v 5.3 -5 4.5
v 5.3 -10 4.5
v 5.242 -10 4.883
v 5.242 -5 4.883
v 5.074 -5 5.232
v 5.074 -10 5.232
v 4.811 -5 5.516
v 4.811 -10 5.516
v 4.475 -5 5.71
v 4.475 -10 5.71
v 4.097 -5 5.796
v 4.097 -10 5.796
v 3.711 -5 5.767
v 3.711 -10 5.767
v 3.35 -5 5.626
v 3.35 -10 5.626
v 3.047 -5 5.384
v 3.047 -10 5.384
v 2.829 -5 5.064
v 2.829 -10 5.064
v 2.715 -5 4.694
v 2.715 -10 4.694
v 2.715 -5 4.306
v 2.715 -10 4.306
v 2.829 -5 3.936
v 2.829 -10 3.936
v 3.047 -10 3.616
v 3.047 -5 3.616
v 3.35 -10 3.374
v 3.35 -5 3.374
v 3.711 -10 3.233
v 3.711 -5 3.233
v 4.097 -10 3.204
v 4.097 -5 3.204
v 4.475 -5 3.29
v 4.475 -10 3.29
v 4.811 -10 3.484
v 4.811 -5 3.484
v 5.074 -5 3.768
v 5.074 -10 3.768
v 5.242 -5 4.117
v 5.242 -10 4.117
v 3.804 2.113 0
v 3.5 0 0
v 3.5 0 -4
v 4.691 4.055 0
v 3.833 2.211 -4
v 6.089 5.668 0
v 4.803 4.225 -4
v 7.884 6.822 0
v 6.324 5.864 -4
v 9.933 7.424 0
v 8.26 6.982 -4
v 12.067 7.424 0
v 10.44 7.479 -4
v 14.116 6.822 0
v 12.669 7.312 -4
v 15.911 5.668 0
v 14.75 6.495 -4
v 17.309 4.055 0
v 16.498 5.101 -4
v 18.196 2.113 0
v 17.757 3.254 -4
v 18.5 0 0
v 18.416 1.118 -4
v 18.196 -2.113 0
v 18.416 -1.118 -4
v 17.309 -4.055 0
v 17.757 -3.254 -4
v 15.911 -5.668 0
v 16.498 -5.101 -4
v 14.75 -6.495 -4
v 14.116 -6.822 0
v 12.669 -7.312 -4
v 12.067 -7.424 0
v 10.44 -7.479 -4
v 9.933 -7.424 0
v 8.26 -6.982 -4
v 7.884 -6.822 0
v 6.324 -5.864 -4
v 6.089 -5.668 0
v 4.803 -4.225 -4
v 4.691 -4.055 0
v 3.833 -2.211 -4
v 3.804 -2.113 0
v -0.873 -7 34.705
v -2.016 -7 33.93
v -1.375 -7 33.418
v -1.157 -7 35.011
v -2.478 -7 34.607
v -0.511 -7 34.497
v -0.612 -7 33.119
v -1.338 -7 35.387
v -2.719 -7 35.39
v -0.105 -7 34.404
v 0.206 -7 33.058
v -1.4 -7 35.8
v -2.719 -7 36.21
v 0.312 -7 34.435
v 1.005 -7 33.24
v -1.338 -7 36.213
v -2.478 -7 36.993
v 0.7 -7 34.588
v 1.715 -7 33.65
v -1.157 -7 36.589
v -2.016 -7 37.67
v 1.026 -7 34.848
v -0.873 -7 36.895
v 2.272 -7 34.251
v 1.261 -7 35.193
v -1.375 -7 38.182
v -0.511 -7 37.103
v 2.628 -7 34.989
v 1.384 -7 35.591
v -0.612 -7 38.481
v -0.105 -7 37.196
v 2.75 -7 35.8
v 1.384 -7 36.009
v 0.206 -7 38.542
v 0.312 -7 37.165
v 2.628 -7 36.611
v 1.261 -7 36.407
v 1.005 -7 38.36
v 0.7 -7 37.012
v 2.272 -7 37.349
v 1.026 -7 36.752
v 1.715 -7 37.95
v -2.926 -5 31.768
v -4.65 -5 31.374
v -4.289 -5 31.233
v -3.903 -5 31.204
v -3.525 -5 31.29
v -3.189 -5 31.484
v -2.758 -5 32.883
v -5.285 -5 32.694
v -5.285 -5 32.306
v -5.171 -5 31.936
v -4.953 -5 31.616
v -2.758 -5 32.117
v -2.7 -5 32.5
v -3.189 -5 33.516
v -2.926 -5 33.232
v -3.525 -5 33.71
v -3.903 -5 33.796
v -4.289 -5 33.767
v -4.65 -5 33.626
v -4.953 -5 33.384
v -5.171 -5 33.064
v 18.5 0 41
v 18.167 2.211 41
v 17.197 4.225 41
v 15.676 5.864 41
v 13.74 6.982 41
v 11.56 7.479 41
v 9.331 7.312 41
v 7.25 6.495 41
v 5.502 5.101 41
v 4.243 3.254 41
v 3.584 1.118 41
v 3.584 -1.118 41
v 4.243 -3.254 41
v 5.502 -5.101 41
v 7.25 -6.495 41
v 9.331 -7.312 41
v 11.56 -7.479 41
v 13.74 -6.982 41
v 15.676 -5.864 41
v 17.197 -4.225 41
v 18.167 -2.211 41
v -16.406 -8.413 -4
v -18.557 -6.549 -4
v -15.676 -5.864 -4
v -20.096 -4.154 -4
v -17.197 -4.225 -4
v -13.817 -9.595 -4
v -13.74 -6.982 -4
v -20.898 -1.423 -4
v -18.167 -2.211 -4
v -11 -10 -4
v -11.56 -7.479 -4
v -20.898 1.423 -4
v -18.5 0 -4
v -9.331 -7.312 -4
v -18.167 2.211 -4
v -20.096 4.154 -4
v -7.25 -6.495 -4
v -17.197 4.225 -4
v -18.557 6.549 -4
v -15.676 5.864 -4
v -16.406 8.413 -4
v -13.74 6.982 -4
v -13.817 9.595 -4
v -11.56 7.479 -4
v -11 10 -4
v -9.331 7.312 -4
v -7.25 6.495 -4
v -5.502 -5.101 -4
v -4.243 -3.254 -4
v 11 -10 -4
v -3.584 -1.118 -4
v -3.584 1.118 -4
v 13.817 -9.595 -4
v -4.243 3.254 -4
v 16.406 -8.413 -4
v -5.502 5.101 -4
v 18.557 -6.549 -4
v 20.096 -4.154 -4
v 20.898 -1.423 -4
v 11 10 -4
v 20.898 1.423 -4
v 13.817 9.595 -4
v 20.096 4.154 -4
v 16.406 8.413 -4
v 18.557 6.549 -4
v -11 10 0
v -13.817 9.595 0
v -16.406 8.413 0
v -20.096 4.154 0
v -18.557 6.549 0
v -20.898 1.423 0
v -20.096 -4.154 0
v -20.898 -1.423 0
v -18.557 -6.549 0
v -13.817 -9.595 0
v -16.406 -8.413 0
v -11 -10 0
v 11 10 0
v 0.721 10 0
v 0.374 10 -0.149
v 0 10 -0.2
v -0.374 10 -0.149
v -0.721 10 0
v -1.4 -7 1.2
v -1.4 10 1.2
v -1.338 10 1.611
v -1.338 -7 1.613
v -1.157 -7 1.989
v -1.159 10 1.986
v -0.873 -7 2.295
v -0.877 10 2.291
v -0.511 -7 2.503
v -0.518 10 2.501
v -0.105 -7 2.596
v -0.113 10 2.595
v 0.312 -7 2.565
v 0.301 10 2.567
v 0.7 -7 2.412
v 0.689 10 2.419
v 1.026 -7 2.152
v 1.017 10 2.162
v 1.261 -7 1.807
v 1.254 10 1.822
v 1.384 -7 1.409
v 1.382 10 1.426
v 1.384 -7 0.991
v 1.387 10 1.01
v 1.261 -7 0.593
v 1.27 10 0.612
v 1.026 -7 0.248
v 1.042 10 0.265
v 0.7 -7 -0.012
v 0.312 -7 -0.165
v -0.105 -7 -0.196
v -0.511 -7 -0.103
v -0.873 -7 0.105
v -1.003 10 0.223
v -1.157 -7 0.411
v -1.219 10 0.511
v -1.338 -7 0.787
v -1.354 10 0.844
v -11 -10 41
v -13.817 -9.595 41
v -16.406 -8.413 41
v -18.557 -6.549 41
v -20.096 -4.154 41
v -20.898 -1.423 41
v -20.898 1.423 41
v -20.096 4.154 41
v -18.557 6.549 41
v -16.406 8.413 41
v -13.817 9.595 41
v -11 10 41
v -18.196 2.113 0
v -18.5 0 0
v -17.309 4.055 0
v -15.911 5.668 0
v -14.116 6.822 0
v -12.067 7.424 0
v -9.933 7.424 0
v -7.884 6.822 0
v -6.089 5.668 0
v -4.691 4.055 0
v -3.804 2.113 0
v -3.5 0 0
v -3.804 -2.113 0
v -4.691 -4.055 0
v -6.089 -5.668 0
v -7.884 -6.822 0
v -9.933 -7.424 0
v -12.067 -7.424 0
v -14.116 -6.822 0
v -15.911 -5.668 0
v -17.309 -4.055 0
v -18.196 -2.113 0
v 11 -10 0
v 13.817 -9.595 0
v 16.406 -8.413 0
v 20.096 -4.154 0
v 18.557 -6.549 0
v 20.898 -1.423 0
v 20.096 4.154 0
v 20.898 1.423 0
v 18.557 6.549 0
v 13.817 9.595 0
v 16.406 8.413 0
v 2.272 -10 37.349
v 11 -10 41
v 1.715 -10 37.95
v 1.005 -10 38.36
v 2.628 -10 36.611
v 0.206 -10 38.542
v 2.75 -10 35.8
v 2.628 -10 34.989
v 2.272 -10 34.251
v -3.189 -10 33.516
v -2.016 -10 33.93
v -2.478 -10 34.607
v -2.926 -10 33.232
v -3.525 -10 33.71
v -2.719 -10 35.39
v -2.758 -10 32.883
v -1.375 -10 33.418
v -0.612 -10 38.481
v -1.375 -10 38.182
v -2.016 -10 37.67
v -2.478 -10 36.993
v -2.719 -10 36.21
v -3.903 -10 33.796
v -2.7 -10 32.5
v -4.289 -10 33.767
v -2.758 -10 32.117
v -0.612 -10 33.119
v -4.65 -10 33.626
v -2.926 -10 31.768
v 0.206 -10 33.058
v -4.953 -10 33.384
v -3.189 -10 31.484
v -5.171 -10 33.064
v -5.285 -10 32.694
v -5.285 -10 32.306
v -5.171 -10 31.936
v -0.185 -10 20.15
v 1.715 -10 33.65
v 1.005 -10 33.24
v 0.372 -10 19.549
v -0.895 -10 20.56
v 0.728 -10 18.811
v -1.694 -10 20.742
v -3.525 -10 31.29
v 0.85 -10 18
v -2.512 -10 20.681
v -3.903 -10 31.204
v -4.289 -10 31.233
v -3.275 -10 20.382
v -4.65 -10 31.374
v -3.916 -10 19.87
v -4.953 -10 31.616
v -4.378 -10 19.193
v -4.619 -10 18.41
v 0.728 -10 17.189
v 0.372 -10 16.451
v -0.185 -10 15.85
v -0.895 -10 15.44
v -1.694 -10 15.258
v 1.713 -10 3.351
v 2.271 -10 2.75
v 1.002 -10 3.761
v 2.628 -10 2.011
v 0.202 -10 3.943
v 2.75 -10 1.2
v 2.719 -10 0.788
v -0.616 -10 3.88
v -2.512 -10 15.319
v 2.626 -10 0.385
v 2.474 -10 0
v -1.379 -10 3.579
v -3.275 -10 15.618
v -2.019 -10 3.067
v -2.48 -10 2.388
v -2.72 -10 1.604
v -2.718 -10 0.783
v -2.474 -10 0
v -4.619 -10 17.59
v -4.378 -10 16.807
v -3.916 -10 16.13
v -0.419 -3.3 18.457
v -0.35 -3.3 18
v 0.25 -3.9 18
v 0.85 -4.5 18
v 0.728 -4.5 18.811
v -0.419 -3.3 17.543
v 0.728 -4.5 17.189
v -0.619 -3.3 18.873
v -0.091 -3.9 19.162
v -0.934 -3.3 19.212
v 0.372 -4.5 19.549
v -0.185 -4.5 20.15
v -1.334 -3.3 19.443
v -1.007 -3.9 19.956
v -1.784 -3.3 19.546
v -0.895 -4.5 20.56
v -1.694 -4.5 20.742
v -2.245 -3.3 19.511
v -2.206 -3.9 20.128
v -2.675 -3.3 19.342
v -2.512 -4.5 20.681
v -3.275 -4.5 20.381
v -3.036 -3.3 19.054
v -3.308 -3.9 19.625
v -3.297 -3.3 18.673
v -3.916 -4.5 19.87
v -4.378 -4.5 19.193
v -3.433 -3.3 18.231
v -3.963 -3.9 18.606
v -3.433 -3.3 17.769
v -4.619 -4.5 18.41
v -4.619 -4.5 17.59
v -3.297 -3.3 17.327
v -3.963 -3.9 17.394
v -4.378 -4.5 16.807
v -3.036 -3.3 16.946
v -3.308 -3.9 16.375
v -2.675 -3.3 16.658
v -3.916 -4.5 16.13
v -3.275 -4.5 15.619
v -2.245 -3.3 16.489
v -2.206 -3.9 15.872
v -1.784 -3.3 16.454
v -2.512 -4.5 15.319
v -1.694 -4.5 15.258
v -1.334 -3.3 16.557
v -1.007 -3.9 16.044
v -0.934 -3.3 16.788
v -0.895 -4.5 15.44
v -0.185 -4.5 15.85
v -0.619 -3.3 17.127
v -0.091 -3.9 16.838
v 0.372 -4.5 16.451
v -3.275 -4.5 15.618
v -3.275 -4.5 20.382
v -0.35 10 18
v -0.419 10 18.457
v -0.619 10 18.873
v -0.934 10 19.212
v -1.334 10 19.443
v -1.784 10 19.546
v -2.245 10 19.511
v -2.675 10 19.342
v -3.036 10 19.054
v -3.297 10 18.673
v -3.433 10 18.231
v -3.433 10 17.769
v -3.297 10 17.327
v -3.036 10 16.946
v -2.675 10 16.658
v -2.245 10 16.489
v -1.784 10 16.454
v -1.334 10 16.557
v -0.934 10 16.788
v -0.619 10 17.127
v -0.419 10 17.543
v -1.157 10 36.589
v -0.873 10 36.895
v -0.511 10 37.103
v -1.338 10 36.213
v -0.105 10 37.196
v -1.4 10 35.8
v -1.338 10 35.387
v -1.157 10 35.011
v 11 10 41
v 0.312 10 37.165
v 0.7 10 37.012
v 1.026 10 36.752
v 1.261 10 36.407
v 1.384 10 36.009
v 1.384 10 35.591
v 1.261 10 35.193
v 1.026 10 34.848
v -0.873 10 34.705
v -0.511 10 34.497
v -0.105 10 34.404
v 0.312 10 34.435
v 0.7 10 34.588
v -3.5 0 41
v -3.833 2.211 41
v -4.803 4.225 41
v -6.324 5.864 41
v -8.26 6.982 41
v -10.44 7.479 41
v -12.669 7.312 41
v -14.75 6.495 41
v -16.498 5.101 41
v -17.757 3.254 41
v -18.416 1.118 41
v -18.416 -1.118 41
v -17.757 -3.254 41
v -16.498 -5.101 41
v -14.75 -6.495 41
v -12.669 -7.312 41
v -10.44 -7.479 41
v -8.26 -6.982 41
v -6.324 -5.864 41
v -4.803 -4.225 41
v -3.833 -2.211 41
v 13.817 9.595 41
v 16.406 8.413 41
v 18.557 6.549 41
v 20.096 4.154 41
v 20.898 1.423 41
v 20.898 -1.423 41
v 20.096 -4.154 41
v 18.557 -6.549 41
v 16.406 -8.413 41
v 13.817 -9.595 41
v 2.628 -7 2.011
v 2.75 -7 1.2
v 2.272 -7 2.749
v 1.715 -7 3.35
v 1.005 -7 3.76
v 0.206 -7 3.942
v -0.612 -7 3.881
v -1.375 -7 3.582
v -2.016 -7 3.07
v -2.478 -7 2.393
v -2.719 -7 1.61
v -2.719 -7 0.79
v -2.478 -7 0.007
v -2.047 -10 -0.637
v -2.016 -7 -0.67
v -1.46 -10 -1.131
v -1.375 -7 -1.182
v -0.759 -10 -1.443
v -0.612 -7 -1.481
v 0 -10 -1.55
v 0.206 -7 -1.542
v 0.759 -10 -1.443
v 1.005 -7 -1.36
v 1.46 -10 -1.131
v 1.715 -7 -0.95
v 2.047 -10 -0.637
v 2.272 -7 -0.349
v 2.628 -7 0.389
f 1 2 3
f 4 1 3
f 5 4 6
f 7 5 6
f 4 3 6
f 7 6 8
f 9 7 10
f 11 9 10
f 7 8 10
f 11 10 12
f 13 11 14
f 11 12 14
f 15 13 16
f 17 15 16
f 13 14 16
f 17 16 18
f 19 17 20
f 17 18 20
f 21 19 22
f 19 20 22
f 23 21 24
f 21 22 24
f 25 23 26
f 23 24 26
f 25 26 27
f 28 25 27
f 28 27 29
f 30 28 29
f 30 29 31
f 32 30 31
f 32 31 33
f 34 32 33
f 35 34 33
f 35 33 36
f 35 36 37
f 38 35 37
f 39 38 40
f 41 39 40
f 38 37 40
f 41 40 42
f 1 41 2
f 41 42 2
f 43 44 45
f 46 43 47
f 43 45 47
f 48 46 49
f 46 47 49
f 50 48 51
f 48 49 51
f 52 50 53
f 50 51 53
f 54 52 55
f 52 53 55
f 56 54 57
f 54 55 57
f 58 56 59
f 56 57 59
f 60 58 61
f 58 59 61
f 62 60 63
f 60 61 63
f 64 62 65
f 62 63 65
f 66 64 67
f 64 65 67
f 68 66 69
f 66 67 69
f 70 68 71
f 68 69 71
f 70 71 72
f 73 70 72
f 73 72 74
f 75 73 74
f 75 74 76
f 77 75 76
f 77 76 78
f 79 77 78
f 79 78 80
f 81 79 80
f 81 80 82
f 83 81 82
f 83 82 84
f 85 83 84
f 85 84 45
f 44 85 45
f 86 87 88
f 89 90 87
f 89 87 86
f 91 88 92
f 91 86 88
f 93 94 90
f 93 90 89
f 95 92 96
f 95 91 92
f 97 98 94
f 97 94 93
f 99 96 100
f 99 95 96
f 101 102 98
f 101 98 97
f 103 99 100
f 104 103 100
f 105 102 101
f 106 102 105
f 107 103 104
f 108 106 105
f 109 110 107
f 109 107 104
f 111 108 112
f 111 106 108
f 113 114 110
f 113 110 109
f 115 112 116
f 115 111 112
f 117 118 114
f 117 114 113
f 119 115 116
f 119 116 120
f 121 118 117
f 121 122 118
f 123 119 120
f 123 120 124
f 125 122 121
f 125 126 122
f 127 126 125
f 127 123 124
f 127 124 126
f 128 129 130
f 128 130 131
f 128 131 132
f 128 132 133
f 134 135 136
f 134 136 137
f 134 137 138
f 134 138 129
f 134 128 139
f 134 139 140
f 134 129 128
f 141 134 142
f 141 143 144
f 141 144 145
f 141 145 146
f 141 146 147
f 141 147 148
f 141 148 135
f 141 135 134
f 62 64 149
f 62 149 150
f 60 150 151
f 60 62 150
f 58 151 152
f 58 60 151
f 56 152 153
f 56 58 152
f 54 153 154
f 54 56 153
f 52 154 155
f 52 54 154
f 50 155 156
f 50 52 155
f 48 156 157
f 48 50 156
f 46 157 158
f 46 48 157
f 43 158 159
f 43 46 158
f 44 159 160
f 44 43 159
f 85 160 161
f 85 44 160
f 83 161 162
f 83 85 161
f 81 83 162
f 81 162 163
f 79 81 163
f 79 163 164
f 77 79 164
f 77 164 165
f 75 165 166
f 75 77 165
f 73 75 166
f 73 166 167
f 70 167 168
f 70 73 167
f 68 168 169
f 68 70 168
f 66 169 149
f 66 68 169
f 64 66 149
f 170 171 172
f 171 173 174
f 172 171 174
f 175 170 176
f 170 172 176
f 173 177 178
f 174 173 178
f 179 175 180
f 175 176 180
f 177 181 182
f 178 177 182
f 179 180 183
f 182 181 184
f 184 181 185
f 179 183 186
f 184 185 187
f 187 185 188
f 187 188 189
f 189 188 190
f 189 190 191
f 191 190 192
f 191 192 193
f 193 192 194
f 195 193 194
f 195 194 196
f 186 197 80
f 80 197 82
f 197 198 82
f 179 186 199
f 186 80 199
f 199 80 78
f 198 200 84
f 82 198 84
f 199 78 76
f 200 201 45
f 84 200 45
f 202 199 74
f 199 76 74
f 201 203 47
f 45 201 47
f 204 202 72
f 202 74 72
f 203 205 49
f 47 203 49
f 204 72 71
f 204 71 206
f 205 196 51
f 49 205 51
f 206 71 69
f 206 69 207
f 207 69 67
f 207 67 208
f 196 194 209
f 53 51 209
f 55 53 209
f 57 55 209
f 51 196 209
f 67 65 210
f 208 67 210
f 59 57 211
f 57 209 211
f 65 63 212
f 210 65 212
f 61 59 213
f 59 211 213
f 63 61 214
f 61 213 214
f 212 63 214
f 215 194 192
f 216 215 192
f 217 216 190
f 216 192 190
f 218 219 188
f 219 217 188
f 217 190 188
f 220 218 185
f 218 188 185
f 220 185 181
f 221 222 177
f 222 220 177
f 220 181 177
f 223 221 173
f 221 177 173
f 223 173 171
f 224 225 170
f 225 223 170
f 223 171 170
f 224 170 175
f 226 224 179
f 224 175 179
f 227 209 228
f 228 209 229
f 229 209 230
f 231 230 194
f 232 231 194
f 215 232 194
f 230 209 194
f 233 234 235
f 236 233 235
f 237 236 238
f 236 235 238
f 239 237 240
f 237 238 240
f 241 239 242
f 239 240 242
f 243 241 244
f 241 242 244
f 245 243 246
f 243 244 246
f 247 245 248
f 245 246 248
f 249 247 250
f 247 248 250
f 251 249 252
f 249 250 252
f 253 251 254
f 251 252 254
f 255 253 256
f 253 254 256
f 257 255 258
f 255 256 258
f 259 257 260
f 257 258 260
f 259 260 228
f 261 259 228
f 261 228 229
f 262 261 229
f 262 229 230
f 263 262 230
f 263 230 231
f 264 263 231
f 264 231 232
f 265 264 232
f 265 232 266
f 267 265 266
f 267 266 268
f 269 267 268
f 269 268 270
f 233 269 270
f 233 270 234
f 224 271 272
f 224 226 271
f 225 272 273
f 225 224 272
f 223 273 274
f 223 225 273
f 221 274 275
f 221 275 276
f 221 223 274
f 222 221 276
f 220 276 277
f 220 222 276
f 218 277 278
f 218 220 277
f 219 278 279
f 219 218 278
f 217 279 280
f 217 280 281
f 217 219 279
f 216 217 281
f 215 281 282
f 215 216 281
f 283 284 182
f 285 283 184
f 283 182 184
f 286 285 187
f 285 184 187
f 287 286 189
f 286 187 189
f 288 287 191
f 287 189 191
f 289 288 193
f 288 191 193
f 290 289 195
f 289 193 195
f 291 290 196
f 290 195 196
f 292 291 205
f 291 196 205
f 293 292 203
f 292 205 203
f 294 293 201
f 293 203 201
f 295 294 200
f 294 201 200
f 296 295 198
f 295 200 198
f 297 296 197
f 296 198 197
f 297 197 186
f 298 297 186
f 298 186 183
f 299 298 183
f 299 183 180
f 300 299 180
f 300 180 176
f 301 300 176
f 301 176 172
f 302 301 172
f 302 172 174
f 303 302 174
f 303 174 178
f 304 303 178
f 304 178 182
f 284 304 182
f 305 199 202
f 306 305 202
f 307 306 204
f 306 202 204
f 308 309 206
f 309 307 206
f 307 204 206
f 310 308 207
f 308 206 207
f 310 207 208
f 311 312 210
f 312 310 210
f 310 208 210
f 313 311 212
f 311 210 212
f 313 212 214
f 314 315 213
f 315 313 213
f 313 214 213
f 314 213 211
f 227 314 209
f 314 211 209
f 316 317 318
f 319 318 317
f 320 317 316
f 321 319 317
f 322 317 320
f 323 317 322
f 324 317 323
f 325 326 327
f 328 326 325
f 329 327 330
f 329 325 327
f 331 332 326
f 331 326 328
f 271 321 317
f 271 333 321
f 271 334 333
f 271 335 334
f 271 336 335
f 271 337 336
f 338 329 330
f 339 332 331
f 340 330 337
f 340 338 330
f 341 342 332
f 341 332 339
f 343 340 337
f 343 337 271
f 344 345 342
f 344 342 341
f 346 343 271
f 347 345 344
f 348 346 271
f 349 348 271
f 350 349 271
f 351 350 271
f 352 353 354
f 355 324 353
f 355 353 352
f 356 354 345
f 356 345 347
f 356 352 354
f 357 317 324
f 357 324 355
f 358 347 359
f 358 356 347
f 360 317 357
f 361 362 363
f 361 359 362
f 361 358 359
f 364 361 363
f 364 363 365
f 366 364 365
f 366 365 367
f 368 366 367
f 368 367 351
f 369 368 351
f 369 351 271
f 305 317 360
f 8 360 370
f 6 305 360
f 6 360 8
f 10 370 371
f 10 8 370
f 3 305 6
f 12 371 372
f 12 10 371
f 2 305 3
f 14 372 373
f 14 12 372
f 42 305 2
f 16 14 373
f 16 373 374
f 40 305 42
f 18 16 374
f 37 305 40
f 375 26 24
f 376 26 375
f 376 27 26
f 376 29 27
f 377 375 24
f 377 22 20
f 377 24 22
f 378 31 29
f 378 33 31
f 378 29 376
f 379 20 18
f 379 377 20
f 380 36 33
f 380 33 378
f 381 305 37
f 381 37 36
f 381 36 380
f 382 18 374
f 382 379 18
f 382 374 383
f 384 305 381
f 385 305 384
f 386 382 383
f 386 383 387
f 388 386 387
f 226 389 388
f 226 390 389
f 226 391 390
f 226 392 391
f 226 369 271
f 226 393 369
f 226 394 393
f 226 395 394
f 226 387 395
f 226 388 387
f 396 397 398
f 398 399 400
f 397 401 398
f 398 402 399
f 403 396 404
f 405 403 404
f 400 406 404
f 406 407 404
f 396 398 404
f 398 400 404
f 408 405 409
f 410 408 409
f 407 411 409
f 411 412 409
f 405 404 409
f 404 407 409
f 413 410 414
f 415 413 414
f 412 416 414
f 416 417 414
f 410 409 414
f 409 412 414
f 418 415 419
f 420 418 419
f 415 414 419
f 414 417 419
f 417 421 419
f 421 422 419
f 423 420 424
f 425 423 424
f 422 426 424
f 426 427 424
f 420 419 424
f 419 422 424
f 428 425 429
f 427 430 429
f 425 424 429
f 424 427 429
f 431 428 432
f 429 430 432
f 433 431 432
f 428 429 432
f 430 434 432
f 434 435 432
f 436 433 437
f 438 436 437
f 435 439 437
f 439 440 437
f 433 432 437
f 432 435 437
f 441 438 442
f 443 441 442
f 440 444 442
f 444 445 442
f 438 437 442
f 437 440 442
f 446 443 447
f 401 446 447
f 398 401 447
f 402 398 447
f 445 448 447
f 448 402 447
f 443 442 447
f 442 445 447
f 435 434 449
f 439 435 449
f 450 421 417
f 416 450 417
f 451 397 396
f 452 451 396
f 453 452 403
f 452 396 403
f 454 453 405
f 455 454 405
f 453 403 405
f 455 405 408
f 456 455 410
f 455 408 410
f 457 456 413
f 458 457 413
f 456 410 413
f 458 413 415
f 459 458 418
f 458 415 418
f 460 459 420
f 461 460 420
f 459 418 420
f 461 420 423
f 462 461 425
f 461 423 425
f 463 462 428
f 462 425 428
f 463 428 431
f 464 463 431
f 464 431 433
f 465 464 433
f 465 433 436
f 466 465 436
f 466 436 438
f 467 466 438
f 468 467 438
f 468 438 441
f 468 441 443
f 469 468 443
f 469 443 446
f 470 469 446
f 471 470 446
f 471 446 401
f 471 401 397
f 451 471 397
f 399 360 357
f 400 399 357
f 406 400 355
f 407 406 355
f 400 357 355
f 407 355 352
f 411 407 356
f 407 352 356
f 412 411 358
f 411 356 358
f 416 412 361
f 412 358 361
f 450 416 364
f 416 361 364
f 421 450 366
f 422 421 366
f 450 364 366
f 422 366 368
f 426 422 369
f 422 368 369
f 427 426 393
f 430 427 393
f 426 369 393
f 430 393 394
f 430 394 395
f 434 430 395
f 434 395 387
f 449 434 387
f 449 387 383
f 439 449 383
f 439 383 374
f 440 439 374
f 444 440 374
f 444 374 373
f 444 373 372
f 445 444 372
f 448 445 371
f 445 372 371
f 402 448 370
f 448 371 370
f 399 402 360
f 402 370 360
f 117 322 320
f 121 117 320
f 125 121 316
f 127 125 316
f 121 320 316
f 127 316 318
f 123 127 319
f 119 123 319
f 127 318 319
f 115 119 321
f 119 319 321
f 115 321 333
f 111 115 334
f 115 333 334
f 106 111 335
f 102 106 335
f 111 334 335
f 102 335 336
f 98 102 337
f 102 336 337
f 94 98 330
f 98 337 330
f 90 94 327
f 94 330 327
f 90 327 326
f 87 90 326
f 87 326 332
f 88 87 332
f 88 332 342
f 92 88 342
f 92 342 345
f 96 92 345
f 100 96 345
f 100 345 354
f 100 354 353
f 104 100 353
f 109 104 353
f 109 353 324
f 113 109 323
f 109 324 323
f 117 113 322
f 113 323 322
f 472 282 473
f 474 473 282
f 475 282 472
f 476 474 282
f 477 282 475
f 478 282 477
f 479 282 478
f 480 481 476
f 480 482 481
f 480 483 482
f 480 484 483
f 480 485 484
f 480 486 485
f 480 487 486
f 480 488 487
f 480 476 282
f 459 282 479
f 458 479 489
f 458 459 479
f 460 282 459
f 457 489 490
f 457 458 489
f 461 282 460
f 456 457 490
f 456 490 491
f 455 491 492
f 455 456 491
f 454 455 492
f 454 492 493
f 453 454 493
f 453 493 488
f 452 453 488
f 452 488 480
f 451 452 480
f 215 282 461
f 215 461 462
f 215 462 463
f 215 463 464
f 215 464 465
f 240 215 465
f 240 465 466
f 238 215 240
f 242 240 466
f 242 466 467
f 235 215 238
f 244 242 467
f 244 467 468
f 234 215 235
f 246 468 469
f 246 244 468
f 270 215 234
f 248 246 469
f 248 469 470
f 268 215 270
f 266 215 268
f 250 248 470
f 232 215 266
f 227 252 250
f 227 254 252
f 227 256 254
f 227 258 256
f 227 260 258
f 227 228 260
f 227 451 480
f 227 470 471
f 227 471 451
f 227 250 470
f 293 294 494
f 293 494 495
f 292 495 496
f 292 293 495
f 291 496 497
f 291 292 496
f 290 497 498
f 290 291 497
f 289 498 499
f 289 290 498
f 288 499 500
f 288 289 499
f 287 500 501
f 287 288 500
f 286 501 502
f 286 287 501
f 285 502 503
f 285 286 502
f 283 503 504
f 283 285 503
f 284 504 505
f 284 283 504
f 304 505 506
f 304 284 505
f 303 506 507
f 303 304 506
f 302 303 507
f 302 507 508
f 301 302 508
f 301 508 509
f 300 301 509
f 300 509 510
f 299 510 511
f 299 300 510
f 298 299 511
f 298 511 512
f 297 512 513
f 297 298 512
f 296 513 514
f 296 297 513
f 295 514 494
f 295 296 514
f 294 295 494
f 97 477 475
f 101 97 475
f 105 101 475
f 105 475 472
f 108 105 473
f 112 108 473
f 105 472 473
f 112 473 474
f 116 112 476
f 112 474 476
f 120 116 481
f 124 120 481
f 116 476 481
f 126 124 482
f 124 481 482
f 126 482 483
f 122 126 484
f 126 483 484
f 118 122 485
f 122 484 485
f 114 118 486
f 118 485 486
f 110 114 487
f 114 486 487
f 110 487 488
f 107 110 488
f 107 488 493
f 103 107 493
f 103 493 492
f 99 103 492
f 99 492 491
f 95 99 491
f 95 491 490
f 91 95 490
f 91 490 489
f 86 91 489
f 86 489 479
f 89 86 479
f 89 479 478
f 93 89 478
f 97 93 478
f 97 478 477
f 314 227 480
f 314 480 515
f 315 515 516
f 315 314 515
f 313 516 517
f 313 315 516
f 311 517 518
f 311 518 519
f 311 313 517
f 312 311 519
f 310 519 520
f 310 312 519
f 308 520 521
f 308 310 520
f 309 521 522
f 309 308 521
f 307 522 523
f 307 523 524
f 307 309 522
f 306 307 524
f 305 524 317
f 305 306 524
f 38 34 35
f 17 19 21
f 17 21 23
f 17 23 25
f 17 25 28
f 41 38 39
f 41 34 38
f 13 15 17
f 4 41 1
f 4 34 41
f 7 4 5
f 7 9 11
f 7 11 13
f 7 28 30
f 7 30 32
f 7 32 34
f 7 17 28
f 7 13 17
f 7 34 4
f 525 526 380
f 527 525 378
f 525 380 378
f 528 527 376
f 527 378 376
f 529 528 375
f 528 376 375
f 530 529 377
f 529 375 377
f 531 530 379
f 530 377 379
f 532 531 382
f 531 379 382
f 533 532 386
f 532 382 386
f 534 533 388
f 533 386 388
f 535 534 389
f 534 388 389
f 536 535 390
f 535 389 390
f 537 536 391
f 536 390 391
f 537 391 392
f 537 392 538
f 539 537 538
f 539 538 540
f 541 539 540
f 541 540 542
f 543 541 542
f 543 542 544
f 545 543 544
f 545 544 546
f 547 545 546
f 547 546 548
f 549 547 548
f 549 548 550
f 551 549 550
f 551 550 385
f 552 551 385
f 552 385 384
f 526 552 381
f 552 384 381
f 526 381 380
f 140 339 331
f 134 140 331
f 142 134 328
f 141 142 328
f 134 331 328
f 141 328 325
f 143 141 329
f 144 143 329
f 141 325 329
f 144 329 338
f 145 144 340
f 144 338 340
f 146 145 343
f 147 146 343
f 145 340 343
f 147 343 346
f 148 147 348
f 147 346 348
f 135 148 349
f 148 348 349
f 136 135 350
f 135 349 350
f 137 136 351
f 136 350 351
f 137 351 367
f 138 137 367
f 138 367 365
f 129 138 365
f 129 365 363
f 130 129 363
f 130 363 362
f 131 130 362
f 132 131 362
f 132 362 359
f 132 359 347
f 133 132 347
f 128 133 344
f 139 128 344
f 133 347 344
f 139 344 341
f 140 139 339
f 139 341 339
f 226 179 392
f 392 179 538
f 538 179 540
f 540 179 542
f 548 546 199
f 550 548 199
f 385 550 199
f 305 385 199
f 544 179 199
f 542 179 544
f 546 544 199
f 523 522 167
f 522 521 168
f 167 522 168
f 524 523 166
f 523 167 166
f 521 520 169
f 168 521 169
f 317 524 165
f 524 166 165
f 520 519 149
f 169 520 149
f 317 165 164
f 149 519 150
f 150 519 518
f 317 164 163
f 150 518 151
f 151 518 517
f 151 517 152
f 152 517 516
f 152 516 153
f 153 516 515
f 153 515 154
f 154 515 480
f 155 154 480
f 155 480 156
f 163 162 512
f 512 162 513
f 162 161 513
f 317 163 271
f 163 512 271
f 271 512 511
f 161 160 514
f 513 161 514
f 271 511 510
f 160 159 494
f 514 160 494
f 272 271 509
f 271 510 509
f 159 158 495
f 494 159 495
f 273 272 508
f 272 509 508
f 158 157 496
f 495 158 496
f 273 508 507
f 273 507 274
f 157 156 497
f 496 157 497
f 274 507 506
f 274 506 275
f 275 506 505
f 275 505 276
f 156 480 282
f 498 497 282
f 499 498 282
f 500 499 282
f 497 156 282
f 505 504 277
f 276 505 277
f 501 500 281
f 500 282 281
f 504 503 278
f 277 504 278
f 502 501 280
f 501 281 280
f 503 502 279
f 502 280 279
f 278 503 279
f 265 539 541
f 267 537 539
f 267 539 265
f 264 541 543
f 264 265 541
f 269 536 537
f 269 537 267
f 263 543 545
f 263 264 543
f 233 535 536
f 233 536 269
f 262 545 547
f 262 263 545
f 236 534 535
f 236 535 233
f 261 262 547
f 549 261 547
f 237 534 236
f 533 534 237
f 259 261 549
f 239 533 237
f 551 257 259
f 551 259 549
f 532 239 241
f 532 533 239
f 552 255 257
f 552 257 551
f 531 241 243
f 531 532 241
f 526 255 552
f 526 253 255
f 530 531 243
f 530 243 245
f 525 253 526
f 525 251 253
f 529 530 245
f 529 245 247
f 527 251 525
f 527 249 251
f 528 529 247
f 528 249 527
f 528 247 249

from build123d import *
from build123d.topology import SkipClean

# Parameters (mm, degrees)
SKETCH_1_R           = 7.5
EXTRUDE_1_DEPTH      = 37
SKETCH_6_R           = 2.75
CUT_EXTRUDE_3_DEPTH  = 5.5
SKETCH_8_R           = 1.55
CUT_EXTRUDE_6_DEPTH  = 45.947191236
CHAMFER_1_SIZE       = 1.2
SKETCH_12_R          = 1.3
CUT_EXTRUDE_8_DEPTH  = 5
SKETCH_17_R          = 7.5
EXTRUDE_5_DEPTH      = 4
EXTRUDE_START        = 4
SKETCH_18_R          = 7.5
EXTRUDE_6_DEPTH      = 4
SKETCH_19_R          = 1.4
CUT_EXTRUDE_12_DEPTH = 51.219518118
SKETCH_20_R          = 2.75
CUT_EXTRUDE_14_DEPTH = 3


with BuildPart() as part:
    # Эскиз1 → Бобышка-Вытянуть1 (new body)
    with BuildSketch(Plane.XY):
        with BuildLine():
            Line((-11, 10), (11, 10))
            ThreePointArc((11, 10), (21, 0), (11, -10))
            Line((11, -10), (-11, -10))
            ThreePointArc((-11, -10), (-21, 0), (-11, 10))
        make_face()
        with Locations((-11, 0)):
            Circle(SKETCH_1_R, mode=Mode.SUBTRACT)
        with Locations((11, 0)):
            Circle(SKETCH_1_R, mode=Mode.SUBTRACT)
    extrude(amount=EXTRUDE_1_DEPTH)

    # Эскиз6 → Вырез-Вытянуть3 (cut)
    with BuildSketch(Plane.XZ.offset(10)):
        with Locations((-1.9, 18)):
            Circle(SKETCH_6_R)
    extrude(amount=-CUT_EXTRUDE_3_DEPTH, mode=Mode.SUBTRACT)

    # Эскиз8 → Вырез-Вытянуть6 (cut, through all)
    with BuildSketch(Plane.XZ.offset(4.5)):
        with Locations((-1.9, 18)):
            Circle(SKETCH_8_R)
    extrude(amount=-CUT_EXTRUDE_6_DEPTH, mode=Mode.SUBTRACT)

    # Фаска1
    chamfer_1_edges = [part.edges().sort_by_distance(p)[0] for p in [
        (-3.45, -4.5, 18),
    ]]
    chamfer(chamfer_1_edges, length=CHAMFER_1_SIZE - 0.0001)  # a hair under: the kernel refuses the full size

    # Эскиз12 → Вырез-Вытянуть8 (cut)
    with BuildSketch(Plane.XZ.offset(10)):
        with Locations((-4, 32.5)):
            Circle(SKETCH_12_R)
        with Locations((4, 4.5)):
            Circle(SKETCH_12_R)
    extrude(amount=-CUT_EXTRUDE_8_DEPTH, mode=Mode.SUBTRACT)

    # Эскиз17 → Бобышка-Вытянуть5 (add)
    with BuildSketch(Plane.XY.offset(37)):
        with BuildLine():
            Line((-11, 10), (11, 10))
            ThreePointArc((11, 10), (21, 0), (11, -10))
            Line((11, -10), (-11, -10))
            ThreePointArc((-11, -10), (-21, 0), (-11, 10))
        make_face()
        with Locations((-11, 0)):
            Circle(SKETCH_17_R, mode=Mode.SUBTRACT)
        with Locations((11, 0)):
            Circle(SKETCH_17_R, mode=Mode.SUBTRACT)
    extrude(amount=EXTRUDE_5_DEPTH)

    # Эскиз18 → Бобышка-Вытянуть6 (add)
    with SkipClean():  # the faces are left unmerged after this step: merging them gives an invalid solid
        with BuildSketch(Plane(origin=(0, 0, 0), x_dir=(-1, 0, 0), z_dir=(0, 0, -1)).offset(EXTRUDE_START)):
            with BuildLine():
                Line((-11, 10), (11, 10))
                ThreePointArc((11, 10), (21, 0), (11, -10))
                Line((11, -10), (-11, -10))
                ThreePointArc((-11, -10), (-21, 0), (-11, 10))
            make_face()
            with Locations((-11, 0)):
                Circle(SKETCH_18_R, mode=Mode.SUBTRACT)
            with Locations((11, 0)):
                Circle(SKETCH_18_R, mode=Mode.SUBTRACT)
        extrude(amount=-EXTRUDE_6_DEPTH)

    # Эскиз19 → Вырез-Вытянуть12 (cut, through all)
    with SkipClean():  # the faces are left unmerged after this step: merging them gives an invalid solid
        with BuildSketch(Plane(origin=(0, 10, 0), x_dir=(1, 0, 0), z_dir=(0, 1, 0))):
            with Locations(Location((0, -1.2, 0), (0, 0, 180))):
                Circle(SKETCH_19_R)
            with Locations(Location((0, -35.8, 0), (0, 0, 180))):
                Circle(SKETCH_19_R)
        extrude(amount=-CUT_EXTRUDE_12_DEPTH, mode=Mode.SUBTRACT)

    # Эскиз20 → Вырез-Вытянуть14 (cut)
    with SkipClean():  # the faces are left unmerged after this step: merging them gives an invalid solid
        with BuildSketch(Plane(origin=(0, -10, 0), x_dir=(-1, 0, 0), z_dir=(0, -1, 0))):
            with Locations(Location((0, -35.8, 0), (0, 0, 180))):
                Circle(SKETCH_20_R)
            with Locations(Location((0, -1.2, 0), (0, 0, 180))):
                Circle(SKETCH_20_R)
        extrude(amount=-CUT_EXTRUDE_14_DEPTH, mode=Mode.SUBTRACT)


solid = part.part
